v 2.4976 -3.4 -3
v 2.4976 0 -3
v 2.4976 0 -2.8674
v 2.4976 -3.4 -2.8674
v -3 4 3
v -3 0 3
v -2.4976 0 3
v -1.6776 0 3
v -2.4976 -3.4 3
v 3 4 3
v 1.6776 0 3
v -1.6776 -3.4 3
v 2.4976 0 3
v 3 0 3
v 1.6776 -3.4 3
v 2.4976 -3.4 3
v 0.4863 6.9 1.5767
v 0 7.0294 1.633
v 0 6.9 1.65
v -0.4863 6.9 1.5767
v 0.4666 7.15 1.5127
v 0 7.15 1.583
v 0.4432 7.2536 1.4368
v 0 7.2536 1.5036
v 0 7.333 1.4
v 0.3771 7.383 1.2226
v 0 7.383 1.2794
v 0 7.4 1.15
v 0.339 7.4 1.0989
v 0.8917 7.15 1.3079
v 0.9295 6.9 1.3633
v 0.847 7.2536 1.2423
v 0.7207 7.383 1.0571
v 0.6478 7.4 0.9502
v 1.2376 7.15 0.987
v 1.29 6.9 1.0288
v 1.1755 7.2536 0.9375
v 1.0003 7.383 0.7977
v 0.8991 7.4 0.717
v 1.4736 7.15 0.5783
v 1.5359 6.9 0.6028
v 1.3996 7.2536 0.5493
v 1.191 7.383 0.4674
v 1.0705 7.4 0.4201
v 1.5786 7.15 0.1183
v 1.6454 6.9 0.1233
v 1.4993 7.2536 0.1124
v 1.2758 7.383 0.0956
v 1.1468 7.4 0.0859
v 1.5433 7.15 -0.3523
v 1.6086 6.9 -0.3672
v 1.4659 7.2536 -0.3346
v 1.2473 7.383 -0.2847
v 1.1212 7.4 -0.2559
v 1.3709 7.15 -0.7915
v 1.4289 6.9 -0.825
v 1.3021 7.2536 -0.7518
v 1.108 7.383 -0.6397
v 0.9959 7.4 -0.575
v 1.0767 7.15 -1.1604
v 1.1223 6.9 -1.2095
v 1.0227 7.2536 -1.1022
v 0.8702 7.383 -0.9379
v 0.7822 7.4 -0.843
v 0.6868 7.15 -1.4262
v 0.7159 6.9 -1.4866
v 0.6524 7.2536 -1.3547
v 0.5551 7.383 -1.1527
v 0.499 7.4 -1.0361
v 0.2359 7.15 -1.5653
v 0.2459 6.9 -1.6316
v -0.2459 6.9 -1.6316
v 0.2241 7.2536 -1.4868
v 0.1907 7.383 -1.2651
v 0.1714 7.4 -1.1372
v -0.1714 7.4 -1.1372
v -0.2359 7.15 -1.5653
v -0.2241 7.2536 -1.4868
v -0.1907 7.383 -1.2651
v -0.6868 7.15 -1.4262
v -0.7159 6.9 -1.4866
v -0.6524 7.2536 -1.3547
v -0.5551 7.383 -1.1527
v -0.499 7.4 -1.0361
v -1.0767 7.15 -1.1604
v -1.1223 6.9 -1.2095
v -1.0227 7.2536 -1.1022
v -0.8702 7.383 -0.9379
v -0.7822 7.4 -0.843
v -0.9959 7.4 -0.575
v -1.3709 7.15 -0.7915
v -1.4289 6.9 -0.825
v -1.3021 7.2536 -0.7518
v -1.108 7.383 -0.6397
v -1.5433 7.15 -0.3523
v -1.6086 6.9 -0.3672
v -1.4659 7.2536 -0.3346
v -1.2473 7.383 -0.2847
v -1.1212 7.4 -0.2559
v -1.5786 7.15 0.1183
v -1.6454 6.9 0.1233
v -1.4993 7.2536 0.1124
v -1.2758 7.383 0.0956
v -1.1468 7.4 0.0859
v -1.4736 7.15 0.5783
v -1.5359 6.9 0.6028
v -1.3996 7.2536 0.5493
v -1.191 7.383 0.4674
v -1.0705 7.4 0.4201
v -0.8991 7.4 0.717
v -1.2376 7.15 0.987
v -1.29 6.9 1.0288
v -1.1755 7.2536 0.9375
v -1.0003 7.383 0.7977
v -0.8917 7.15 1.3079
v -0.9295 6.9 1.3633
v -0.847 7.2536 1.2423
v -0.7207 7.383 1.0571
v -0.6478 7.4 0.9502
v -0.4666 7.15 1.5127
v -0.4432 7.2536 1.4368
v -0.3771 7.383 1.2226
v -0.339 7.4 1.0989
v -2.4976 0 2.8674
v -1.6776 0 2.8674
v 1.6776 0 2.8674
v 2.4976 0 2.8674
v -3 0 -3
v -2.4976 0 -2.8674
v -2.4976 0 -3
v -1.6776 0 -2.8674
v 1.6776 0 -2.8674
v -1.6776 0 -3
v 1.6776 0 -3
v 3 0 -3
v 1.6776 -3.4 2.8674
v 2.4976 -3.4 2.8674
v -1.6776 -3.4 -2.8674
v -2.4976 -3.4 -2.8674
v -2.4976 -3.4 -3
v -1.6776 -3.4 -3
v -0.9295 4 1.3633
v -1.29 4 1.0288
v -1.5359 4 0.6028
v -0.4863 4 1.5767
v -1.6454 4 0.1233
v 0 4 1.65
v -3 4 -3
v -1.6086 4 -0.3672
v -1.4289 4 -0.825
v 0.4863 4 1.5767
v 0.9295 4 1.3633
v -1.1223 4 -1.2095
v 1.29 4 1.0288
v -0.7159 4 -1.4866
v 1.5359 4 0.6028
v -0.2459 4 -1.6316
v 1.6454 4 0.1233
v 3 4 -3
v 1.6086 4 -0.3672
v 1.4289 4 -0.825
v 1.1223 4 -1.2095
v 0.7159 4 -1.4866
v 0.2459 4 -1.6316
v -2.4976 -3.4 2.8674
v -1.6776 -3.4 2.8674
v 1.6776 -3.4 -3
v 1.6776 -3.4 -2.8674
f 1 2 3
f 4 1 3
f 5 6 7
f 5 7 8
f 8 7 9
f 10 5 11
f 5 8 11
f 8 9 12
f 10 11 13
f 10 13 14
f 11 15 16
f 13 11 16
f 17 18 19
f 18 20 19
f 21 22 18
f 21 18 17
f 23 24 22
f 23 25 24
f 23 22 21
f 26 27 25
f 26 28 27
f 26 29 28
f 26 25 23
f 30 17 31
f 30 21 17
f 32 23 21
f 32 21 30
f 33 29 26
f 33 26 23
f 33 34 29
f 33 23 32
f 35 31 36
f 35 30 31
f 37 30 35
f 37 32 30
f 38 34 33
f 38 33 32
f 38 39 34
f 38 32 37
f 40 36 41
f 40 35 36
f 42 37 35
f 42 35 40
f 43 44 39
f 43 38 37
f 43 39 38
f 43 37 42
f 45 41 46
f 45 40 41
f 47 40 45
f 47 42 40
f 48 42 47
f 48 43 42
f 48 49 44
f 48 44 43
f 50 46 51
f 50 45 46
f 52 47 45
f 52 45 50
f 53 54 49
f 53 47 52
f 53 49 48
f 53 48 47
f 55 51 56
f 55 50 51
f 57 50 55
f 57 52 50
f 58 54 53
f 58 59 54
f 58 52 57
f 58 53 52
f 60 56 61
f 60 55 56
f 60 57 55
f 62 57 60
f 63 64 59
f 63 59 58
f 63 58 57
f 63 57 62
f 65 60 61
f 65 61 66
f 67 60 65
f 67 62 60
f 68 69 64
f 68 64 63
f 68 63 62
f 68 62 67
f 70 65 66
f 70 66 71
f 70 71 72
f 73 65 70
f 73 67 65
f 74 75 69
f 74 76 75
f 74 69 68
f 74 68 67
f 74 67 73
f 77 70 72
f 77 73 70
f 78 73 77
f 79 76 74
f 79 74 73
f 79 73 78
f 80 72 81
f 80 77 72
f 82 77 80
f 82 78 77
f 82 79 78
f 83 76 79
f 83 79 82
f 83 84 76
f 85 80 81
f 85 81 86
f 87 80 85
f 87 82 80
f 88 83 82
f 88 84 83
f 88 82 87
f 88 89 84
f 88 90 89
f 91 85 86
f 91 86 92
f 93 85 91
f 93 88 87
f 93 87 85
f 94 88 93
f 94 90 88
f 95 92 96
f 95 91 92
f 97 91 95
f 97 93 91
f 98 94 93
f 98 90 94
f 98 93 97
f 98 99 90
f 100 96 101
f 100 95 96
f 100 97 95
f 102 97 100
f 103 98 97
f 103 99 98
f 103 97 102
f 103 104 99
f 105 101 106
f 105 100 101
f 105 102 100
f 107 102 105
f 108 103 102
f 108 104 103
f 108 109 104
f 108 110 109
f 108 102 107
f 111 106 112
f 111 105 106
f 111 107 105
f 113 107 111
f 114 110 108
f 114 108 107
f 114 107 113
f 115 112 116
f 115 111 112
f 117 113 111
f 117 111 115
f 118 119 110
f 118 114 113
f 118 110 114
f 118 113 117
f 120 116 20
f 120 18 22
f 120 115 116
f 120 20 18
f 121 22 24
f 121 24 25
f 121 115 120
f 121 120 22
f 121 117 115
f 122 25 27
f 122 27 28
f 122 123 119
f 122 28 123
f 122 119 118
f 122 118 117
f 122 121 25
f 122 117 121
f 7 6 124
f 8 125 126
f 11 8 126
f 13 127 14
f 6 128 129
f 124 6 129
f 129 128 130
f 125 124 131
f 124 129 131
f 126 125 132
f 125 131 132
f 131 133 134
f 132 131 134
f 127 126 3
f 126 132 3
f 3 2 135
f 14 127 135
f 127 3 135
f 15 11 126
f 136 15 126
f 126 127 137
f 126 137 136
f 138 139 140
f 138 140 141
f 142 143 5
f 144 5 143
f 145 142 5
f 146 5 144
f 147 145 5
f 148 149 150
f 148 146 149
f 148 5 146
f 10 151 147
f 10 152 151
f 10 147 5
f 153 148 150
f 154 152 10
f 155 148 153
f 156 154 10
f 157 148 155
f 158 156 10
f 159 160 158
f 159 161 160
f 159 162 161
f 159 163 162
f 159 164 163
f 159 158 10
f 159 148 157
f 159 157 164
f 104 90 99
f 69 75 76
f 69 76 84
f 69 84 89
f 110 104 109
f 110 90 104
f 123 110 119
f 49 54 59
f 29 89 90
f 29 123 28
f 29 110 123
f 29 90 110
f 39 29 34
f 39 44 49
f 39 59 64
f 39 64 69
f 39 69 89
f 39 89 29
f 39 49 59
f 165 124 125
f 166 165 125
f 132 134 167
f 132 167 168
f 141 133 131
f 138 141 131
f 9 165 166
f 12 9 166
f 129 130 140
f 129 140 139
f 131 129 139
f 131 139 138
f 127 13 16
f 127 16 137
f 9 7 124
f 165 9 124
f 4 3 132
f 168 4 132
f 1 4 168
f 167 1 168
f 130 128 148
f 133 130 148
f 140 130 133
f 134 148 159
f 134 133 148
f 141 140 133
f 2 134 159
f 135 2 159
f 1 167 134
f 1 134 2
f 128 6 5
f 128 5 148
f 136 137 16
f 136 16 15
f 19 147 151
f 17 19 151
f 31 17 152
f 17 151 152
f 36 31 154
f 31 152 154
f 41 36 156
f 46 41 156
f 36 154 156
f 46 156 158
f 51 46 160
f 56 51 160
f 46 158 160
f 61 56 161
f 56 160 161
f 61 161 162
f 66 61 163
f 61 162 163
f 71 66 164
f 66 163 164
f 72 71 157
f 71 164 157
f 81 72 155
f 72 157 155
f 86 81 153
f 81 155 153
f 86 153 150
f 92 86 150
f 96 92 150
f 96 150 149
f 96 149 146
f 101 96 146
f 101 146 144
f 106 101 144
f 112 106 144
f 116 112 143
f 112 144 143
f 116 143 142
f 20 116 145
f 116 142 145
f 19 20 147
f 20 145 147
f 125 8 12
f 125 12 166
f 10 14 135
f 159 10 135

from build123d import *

# Parameters (mm, degrees)
ESQUISSE1_W                                = 6
ESQUISSE1_H                                = 6
BOSS_EXTRU_1_DEPTH                         = 4
ESQUISSE2_R                                = 1.65
BOSS_EXTRU_2_DEPTH                         = 3.4
CONG_1_R                                   = 0.5
ESQUISSE3_W                                = 0.819968842
ESQUISSE3_H                                = 0.132597198
BOSS_EXTRU_3_DEPTH                         = 3.4
SYM_TRIE1_AT_THE_SECOND_PLANE_COPY_1_SKE_W = 0.819968842
SYM_TRIE1_AT_THE_SECOND_PLANE_COPY_1_SKE_H = 0.132597198
SYM_TRIE1_AT_THE_SECOND_PLANE_COPY_1_DEPTH = 3.4


with BuildPart() as part:
    # Esquisse1 → Boss.-Extru.1 (new body)
    with BuildSketch(Plane(origin=(0, 0, 0), x_dir=(1, 0, 0), z_dir=(0, 1, 0))):
        Rectangle(ESQUISSE1_W, ESQUISSE1_H)
    extrude(amount=BOSS_EXTRU_1_DEPTH)

    # Esquisse2 → Boss.-Extru.2 (add)
    with BuildSketch(Plane(origin=(0, 4, 0), x_dir=(1, 0, 0), z_dir=(0, 1, 0))):
        Circle(ESQUISSE2_R)
    extrude(amount=BOSS_EXTRU_2_DEPTH)

    # Congé1
    cong_1_edges = [part.edges().sort_by_distance(p)[0] for p in [
        (-1.65, 7.4, 0),
    ]]
    fillet(cong_1_edges, radius=CONG_1_R)

    # Esquisse3 → Boss.-Extru.3 (add)
    with BuildSketch(Plane.XZ):
        with Locations((-2.087621823, -2.933701401)):
            Rectangle(ESQUISSE3_W, ESQUISSE3_H)
    boss_extru_3 = extrude(amount=BOSS_EXTRU_3_DEPTH)

    # Symétrie1: Boss.-Extru.3 across plane
    add(boss_extru_3.mirror(Plane(origin=(0, 0, 0), x_dir=(0, 0, 1), z_dir=(1, 0, 0))))

    # Symétrie1 at the second plane: Boss.-Extru.3 across plane
    add(boss_extru_3.mirror(Plane.XY))

    # Symétrie1 at the second plane copy 1 ske → Symétrie1 at the second plane copy 1 (add)
    with BuildSketch(Plane(origin=(0, 0, 0), x_dir=(-1, 0, 0), z_dir=(0, -1, 0))):
        with Locations((-2.087621823, -2.933701401)):
            Rectangle(SYM_TRIE1_AT_THE_SECOND_PLANE_COPY_1_SKE_W, SYM_TRIE1_AT_THE_SECOND_PLANE_COPY_1_SKE_H)
    extrude(amount=SYM_TRIE1_AT_THE_SECOND_PLANE_COPY_1_DEPTH)


solid = part.part
